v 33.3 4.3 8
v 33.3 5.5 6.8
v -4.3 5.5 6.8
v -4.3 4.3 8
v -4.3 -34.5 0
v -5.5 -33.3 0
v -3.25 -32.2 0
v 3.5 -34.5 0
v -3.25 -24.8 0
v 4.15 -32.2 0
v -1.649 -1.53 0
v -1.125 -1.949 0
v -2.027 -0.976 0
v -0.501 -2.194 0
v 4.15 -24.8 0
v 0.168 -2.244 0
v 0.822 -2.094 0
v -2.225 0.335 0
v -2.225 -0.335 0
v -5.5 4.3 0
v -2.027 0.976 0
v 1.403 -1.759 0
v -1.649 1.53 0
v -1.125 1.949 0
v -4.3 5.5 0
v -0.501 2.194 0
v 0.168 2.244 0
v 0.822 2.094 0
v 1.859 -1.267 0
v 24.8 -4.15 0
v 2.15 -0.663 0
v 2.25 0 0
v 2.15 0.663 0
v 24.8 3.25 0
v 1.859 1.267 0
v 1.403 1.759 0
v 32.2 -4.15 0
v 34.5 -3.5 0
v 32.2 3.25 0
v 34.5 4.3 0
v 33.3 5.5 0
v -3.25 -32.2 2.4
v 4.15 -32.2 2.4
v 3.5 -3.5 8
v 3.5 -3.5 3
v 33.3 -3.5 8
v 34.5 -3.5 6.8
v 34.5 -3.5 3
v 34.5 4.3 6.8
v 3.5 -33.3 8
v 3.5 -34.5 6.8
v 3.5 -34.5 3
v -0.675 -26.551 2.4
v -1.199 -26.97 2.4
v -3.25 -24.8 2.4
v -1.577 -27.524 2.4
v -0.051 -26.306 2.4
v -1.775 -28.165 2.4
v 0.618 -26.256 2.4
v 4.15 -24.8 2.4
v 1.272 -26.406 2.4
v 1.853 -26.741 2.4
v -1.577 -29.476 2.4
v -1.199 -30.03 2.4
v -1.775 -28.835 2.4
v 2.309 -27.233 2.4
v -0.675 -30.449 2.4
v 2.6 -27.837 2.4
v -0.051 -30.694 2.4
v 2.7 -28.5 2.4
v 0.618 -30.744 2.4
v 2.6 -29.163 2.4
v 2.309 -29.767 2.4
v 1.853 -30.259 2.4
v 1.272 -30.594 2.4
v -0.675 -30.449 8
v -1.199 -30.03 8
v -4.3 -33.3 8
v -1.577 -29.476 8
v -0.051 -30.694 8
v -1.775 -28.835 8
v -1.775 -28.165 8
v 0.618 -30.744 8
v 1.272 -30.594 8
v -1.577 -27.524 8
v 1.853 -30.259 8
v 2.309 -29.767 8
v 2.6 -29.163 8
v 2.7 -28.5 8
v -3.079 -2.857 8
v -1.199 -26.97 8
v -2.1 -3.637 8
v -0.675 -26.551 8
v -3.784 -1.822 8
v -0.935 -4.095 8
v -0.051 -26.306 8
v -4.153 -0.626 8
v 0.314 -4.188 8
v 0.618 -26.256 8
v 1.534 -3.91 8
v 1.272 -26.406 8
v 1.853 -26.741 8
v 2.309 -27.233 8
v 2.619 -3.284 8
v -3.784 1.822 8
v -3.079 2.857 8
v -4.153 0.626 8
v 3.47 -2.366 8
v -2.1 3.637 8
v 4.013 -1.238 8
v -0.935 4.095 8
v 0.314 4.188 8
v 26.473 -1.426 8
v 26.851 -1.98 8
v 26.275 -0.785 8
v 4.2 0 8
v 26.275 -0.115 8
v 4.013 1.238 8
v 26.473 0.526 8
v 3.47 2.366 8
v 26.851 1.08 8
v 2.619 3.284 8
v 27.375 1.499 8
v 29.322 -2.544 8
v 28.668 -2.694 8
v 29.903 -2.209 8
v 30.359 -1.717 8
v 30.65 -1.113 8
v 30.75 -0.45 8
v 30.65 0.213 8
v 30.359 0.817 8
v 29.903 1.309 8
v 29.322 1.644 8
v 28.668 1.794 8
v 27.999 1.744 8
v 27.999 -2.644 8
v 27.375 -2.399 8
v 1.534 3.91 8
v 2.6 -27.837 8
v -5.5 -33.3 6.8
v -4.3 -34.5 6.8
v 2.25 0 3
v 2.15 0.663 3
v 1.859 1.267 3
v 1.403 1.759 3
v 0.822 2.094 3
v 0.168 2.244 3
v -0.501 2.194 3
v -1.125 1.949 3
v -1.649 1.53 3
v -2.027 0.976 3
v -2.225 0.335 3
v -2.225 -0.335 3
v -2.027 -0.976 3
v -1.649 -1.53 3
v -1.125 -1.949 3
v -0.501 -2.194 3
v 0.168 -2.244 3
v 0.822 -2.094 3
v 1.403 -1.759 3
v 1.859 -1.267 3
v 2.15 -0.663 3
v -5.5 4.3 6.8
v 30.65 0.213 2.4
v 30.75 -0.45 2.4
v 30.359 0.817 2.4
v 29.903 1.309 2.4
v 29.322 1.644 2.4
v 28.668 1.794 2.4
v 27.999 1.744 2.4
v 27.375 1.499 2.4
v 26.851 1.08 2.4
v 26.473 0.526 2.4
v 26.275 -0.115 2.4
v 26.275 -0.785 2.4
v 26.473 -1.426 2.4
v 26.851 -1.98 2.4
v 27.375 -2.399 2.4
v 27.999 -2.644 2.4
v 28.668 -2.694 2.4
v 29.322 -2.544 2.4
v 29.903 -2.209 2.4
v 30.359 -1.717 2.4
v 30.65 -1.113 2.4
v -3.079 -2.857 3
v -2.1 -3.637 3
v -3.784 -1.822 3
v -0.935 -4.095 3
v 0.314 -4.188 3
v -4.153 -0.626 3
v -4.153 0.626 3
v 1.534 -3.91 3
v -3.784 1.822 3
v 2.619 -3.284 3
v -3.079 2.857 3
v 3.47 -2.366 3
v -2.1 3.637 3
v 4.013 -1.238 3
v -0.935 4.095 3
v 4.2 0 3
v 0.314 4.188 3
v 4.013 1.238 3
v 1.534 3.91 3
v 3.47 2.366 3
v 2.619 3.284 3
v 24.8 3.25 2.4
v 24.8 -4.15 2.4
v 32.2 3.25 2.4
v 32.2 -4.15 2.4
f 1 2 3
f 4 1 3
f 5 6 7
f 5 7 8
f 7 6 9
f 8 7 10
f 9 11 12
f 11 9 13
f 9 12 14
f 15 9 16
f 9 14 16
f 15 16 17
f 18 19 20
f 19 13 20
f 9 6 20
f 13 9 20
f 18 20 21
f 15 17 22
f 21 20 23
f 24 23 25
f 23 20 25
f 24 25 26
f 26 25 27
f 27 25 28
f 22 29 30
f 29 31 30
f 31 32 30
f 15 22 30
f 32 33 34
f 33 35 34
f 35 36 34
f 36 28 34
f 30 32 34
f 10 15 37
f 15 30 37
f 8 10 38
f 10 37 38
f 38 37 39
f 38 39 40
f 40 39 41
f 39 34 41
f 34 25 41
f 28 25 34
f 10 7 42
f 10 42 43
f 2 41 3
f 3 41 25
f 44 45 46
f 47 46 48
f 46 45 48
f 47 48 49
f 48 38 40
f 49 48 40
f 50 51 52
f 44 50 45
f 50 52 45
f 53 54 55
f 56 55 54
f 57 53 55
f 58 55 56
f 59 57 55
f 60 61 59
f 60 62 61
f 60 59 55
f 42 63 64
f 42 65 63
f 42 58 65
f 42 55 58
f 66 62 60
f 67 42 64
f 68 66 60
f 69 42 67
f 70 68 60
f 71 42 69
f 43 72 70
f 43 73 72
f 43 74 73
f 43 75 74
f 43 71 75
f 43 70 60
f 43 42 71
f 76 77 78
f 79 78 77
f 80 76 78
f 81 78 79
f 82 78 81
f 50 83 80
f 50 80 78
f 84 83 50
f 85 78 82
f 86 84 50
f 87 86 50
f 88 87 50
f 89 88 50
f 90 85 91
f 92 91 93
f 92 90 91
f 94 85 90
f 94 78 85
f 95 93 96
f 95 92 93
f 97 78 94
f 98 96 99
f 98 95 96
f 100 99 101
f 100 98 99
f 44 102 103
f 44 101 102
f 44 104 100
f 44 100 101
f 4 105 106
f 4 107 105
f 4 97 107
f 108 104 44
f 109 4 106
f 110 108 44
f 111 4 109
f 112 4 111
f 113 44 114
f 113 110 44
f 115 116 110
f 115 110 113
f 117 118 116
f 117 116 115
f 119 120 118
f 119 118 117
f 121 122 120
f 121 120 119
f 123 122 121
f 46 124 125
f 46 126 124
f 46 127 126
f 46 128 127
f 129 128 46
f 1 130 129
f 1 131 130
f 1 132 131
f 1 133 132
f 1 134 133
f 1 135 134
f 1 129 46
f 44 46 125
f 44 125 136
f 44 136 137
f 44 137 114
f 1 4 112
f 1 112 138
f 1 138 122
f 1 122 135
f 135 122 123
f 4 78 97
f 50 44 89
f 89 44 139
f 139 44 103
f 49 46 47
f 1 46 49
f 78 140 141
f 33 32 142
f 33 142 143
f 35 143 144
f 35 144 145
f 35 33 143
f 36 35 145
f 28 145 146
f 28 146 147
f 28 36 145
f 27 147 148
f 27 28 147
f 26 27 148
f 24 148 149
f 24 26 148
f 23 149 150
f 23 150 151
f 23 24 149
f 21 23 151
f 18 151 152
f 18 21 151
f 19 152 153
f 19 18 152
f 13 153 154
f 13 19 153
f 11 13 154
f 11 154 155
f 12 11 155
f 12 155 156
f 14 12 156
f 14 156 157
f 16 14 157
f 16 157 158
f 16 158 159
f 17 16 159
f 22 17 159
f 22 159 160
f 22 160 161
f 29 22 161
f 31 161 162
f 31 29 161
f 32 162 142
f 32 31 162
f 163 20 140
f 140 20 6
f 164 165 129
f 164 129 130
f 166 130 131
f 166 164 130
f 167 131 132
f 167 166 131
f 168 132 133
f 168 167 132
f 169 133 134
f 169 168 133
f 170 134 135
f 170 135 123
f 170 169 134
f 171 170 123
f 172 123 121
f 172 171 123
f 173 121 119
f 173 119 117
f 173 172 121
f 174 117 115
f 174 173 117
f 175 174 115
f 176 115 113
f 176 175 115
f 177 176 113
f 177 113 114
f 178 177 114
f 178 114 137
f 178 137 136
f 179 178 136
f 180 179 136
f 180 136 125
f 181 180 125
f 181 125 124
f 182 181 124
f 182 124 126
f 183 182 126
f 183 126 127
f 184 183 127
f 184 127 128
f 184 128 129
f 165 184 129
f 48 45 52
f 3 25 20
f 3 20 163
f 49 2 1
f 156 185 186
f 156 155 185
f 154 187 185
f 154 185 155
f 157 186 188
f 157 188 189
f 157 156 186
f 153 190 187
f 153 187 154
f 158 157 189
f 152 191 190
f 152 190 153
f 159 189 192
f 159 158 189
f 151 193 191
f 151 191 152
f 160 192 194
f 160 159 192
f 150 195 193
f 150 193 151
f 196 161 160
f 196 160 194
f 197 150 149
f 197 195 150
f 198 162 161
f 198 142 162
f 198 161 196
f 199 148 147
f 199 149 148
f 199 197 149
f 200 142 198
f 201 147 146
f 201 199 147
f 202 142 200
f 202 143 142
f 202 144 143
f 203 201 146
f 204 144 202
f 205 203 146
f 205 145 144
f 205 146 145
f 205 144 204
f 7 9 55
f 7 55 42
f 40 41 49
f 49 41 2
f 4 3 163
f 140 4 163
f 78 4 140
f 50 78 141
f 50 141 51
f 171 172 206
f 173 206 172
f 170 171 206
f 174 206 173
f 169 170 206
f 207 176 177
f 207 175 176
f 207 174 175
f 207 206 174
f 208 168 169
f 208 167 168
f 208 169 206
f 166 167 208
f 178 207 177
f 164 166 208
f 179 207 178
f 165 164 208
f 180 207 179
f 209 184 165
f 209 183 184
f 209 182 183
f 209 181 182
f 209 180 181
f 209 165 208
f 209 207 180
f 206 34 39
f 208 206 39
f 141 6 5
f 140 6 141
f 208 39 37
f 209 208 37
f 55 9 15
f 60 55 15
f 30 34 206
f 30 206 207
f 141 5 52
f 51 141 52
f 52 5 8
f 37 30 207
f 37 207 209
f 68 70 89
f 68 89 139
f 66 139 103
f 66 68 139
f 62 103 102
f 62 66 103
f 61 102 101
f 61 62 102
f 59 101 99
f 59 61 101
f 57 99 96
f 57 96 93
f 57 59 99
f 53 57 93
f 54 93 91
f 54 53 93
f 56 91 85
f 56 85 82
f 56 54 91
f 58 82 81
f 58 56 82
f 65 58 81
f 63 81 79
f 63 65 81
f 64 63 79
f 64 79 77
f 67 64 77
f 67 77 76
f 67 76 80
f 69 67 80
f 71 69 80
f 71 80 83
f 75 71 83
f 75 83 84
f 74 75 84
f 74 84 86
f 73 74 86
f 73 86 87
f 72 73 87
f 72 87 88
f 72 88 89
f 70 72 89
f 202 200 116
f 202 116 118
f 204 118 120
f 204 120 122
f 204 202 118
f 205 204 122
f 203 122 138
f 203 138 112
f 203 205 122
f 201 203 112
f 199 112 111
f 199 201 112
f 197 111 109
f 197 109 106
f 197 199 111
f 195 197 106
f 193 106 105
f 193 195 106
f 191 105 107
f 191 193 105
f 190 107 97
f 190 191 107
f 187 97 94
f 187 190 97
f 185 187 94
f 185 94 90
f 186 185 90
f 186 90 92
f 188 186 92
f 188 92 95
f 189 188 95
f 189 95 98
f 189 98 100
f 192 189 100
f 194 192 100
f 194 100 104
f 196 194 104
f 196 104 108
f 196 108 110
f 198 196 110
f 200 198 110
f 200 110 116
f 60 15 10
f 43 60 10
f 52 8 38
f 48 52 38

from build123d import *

# Parameters (mm, degrees)
F0_R     = 2.25
F0_R_2   = 4.2
F1_DEPTH = 8
F2_DEPTH = 3
F3_W     = 7.4
F3_H     = 7.4
F3_R     = 2.25
F4_DEPTH = 2.4
F5_SIZE  = 1.2


with BuildPart() as f1:
    # F0 (on Top) → F1 (new body)
    with BuildSketch(Plane.XY):
        Polygon((34.5, 5.5), (-5.5, 5.5), (-5.5, -34.5), (3.5, -34.5), (3.5, -3.5), (34.5, -3.5), align=None)
        with Locations((0.45, -28.5)):
            Circle(F0_R, mode=Mode.SUBTRACT)
        Circle(F0_R_2, mode=Mode.SUBTRACT)
        with Locations((28.5, -0.45)):
            Circle(F0_R, mode=Mode.SUBTRACT)
    extrude(amount=F1_DEPTH)

    # F0 (on Top) → F2 (join)
    with BuildSketch(Plane.XY):
        Polygon((3.5, -34.5), (34.5, -3.5), (3.5, -3.5), align=None)
        Circle(F0_R_2)
        Circle(F0_R, mode=Mode.SUBTRACT)
    extrude(amount=F2_DEPTH)

    # F3 (on face) → F4 (cut)
    with BuildSketch(Plane(origin=(0, 0, 0), x_dir=(1, 0, 0), z_dir=(0, 0, -1))):
        with Locations((0.45, 28.5)):
            Rectangle(F3_W, F3_H)
        with Locations((0.45, 28.5)):
            Circle(F3_R, mode=Mode.SUBTRACT)
        with Locations((28.5, 0.45)):
            Rectangle(F3_W, F3_H)
        with Locations((28.5, 0.45)):
            Circle(F3_R, mode=Mode.SUBTRACT)
    extrude(amount=-F4_DEPTH, mode=Mode.SUBTRACT)

    # F5
    f5_edges = [f1.edges().sort_by_distance(p)[0] for p in [
        (-5.5, 5.5, 4),
        (-5.5, -34.5, 4),
        (34.5, 5.5, 4),
        (14.5, 5.5, 8),
        (-5.5, -14.5, 8),
        (-1, -34.5, 8),
        (34.5, 1, 8),
    ]]
    chamfer(f5_edges, length=F5_SIZE)


solid = f1.part
